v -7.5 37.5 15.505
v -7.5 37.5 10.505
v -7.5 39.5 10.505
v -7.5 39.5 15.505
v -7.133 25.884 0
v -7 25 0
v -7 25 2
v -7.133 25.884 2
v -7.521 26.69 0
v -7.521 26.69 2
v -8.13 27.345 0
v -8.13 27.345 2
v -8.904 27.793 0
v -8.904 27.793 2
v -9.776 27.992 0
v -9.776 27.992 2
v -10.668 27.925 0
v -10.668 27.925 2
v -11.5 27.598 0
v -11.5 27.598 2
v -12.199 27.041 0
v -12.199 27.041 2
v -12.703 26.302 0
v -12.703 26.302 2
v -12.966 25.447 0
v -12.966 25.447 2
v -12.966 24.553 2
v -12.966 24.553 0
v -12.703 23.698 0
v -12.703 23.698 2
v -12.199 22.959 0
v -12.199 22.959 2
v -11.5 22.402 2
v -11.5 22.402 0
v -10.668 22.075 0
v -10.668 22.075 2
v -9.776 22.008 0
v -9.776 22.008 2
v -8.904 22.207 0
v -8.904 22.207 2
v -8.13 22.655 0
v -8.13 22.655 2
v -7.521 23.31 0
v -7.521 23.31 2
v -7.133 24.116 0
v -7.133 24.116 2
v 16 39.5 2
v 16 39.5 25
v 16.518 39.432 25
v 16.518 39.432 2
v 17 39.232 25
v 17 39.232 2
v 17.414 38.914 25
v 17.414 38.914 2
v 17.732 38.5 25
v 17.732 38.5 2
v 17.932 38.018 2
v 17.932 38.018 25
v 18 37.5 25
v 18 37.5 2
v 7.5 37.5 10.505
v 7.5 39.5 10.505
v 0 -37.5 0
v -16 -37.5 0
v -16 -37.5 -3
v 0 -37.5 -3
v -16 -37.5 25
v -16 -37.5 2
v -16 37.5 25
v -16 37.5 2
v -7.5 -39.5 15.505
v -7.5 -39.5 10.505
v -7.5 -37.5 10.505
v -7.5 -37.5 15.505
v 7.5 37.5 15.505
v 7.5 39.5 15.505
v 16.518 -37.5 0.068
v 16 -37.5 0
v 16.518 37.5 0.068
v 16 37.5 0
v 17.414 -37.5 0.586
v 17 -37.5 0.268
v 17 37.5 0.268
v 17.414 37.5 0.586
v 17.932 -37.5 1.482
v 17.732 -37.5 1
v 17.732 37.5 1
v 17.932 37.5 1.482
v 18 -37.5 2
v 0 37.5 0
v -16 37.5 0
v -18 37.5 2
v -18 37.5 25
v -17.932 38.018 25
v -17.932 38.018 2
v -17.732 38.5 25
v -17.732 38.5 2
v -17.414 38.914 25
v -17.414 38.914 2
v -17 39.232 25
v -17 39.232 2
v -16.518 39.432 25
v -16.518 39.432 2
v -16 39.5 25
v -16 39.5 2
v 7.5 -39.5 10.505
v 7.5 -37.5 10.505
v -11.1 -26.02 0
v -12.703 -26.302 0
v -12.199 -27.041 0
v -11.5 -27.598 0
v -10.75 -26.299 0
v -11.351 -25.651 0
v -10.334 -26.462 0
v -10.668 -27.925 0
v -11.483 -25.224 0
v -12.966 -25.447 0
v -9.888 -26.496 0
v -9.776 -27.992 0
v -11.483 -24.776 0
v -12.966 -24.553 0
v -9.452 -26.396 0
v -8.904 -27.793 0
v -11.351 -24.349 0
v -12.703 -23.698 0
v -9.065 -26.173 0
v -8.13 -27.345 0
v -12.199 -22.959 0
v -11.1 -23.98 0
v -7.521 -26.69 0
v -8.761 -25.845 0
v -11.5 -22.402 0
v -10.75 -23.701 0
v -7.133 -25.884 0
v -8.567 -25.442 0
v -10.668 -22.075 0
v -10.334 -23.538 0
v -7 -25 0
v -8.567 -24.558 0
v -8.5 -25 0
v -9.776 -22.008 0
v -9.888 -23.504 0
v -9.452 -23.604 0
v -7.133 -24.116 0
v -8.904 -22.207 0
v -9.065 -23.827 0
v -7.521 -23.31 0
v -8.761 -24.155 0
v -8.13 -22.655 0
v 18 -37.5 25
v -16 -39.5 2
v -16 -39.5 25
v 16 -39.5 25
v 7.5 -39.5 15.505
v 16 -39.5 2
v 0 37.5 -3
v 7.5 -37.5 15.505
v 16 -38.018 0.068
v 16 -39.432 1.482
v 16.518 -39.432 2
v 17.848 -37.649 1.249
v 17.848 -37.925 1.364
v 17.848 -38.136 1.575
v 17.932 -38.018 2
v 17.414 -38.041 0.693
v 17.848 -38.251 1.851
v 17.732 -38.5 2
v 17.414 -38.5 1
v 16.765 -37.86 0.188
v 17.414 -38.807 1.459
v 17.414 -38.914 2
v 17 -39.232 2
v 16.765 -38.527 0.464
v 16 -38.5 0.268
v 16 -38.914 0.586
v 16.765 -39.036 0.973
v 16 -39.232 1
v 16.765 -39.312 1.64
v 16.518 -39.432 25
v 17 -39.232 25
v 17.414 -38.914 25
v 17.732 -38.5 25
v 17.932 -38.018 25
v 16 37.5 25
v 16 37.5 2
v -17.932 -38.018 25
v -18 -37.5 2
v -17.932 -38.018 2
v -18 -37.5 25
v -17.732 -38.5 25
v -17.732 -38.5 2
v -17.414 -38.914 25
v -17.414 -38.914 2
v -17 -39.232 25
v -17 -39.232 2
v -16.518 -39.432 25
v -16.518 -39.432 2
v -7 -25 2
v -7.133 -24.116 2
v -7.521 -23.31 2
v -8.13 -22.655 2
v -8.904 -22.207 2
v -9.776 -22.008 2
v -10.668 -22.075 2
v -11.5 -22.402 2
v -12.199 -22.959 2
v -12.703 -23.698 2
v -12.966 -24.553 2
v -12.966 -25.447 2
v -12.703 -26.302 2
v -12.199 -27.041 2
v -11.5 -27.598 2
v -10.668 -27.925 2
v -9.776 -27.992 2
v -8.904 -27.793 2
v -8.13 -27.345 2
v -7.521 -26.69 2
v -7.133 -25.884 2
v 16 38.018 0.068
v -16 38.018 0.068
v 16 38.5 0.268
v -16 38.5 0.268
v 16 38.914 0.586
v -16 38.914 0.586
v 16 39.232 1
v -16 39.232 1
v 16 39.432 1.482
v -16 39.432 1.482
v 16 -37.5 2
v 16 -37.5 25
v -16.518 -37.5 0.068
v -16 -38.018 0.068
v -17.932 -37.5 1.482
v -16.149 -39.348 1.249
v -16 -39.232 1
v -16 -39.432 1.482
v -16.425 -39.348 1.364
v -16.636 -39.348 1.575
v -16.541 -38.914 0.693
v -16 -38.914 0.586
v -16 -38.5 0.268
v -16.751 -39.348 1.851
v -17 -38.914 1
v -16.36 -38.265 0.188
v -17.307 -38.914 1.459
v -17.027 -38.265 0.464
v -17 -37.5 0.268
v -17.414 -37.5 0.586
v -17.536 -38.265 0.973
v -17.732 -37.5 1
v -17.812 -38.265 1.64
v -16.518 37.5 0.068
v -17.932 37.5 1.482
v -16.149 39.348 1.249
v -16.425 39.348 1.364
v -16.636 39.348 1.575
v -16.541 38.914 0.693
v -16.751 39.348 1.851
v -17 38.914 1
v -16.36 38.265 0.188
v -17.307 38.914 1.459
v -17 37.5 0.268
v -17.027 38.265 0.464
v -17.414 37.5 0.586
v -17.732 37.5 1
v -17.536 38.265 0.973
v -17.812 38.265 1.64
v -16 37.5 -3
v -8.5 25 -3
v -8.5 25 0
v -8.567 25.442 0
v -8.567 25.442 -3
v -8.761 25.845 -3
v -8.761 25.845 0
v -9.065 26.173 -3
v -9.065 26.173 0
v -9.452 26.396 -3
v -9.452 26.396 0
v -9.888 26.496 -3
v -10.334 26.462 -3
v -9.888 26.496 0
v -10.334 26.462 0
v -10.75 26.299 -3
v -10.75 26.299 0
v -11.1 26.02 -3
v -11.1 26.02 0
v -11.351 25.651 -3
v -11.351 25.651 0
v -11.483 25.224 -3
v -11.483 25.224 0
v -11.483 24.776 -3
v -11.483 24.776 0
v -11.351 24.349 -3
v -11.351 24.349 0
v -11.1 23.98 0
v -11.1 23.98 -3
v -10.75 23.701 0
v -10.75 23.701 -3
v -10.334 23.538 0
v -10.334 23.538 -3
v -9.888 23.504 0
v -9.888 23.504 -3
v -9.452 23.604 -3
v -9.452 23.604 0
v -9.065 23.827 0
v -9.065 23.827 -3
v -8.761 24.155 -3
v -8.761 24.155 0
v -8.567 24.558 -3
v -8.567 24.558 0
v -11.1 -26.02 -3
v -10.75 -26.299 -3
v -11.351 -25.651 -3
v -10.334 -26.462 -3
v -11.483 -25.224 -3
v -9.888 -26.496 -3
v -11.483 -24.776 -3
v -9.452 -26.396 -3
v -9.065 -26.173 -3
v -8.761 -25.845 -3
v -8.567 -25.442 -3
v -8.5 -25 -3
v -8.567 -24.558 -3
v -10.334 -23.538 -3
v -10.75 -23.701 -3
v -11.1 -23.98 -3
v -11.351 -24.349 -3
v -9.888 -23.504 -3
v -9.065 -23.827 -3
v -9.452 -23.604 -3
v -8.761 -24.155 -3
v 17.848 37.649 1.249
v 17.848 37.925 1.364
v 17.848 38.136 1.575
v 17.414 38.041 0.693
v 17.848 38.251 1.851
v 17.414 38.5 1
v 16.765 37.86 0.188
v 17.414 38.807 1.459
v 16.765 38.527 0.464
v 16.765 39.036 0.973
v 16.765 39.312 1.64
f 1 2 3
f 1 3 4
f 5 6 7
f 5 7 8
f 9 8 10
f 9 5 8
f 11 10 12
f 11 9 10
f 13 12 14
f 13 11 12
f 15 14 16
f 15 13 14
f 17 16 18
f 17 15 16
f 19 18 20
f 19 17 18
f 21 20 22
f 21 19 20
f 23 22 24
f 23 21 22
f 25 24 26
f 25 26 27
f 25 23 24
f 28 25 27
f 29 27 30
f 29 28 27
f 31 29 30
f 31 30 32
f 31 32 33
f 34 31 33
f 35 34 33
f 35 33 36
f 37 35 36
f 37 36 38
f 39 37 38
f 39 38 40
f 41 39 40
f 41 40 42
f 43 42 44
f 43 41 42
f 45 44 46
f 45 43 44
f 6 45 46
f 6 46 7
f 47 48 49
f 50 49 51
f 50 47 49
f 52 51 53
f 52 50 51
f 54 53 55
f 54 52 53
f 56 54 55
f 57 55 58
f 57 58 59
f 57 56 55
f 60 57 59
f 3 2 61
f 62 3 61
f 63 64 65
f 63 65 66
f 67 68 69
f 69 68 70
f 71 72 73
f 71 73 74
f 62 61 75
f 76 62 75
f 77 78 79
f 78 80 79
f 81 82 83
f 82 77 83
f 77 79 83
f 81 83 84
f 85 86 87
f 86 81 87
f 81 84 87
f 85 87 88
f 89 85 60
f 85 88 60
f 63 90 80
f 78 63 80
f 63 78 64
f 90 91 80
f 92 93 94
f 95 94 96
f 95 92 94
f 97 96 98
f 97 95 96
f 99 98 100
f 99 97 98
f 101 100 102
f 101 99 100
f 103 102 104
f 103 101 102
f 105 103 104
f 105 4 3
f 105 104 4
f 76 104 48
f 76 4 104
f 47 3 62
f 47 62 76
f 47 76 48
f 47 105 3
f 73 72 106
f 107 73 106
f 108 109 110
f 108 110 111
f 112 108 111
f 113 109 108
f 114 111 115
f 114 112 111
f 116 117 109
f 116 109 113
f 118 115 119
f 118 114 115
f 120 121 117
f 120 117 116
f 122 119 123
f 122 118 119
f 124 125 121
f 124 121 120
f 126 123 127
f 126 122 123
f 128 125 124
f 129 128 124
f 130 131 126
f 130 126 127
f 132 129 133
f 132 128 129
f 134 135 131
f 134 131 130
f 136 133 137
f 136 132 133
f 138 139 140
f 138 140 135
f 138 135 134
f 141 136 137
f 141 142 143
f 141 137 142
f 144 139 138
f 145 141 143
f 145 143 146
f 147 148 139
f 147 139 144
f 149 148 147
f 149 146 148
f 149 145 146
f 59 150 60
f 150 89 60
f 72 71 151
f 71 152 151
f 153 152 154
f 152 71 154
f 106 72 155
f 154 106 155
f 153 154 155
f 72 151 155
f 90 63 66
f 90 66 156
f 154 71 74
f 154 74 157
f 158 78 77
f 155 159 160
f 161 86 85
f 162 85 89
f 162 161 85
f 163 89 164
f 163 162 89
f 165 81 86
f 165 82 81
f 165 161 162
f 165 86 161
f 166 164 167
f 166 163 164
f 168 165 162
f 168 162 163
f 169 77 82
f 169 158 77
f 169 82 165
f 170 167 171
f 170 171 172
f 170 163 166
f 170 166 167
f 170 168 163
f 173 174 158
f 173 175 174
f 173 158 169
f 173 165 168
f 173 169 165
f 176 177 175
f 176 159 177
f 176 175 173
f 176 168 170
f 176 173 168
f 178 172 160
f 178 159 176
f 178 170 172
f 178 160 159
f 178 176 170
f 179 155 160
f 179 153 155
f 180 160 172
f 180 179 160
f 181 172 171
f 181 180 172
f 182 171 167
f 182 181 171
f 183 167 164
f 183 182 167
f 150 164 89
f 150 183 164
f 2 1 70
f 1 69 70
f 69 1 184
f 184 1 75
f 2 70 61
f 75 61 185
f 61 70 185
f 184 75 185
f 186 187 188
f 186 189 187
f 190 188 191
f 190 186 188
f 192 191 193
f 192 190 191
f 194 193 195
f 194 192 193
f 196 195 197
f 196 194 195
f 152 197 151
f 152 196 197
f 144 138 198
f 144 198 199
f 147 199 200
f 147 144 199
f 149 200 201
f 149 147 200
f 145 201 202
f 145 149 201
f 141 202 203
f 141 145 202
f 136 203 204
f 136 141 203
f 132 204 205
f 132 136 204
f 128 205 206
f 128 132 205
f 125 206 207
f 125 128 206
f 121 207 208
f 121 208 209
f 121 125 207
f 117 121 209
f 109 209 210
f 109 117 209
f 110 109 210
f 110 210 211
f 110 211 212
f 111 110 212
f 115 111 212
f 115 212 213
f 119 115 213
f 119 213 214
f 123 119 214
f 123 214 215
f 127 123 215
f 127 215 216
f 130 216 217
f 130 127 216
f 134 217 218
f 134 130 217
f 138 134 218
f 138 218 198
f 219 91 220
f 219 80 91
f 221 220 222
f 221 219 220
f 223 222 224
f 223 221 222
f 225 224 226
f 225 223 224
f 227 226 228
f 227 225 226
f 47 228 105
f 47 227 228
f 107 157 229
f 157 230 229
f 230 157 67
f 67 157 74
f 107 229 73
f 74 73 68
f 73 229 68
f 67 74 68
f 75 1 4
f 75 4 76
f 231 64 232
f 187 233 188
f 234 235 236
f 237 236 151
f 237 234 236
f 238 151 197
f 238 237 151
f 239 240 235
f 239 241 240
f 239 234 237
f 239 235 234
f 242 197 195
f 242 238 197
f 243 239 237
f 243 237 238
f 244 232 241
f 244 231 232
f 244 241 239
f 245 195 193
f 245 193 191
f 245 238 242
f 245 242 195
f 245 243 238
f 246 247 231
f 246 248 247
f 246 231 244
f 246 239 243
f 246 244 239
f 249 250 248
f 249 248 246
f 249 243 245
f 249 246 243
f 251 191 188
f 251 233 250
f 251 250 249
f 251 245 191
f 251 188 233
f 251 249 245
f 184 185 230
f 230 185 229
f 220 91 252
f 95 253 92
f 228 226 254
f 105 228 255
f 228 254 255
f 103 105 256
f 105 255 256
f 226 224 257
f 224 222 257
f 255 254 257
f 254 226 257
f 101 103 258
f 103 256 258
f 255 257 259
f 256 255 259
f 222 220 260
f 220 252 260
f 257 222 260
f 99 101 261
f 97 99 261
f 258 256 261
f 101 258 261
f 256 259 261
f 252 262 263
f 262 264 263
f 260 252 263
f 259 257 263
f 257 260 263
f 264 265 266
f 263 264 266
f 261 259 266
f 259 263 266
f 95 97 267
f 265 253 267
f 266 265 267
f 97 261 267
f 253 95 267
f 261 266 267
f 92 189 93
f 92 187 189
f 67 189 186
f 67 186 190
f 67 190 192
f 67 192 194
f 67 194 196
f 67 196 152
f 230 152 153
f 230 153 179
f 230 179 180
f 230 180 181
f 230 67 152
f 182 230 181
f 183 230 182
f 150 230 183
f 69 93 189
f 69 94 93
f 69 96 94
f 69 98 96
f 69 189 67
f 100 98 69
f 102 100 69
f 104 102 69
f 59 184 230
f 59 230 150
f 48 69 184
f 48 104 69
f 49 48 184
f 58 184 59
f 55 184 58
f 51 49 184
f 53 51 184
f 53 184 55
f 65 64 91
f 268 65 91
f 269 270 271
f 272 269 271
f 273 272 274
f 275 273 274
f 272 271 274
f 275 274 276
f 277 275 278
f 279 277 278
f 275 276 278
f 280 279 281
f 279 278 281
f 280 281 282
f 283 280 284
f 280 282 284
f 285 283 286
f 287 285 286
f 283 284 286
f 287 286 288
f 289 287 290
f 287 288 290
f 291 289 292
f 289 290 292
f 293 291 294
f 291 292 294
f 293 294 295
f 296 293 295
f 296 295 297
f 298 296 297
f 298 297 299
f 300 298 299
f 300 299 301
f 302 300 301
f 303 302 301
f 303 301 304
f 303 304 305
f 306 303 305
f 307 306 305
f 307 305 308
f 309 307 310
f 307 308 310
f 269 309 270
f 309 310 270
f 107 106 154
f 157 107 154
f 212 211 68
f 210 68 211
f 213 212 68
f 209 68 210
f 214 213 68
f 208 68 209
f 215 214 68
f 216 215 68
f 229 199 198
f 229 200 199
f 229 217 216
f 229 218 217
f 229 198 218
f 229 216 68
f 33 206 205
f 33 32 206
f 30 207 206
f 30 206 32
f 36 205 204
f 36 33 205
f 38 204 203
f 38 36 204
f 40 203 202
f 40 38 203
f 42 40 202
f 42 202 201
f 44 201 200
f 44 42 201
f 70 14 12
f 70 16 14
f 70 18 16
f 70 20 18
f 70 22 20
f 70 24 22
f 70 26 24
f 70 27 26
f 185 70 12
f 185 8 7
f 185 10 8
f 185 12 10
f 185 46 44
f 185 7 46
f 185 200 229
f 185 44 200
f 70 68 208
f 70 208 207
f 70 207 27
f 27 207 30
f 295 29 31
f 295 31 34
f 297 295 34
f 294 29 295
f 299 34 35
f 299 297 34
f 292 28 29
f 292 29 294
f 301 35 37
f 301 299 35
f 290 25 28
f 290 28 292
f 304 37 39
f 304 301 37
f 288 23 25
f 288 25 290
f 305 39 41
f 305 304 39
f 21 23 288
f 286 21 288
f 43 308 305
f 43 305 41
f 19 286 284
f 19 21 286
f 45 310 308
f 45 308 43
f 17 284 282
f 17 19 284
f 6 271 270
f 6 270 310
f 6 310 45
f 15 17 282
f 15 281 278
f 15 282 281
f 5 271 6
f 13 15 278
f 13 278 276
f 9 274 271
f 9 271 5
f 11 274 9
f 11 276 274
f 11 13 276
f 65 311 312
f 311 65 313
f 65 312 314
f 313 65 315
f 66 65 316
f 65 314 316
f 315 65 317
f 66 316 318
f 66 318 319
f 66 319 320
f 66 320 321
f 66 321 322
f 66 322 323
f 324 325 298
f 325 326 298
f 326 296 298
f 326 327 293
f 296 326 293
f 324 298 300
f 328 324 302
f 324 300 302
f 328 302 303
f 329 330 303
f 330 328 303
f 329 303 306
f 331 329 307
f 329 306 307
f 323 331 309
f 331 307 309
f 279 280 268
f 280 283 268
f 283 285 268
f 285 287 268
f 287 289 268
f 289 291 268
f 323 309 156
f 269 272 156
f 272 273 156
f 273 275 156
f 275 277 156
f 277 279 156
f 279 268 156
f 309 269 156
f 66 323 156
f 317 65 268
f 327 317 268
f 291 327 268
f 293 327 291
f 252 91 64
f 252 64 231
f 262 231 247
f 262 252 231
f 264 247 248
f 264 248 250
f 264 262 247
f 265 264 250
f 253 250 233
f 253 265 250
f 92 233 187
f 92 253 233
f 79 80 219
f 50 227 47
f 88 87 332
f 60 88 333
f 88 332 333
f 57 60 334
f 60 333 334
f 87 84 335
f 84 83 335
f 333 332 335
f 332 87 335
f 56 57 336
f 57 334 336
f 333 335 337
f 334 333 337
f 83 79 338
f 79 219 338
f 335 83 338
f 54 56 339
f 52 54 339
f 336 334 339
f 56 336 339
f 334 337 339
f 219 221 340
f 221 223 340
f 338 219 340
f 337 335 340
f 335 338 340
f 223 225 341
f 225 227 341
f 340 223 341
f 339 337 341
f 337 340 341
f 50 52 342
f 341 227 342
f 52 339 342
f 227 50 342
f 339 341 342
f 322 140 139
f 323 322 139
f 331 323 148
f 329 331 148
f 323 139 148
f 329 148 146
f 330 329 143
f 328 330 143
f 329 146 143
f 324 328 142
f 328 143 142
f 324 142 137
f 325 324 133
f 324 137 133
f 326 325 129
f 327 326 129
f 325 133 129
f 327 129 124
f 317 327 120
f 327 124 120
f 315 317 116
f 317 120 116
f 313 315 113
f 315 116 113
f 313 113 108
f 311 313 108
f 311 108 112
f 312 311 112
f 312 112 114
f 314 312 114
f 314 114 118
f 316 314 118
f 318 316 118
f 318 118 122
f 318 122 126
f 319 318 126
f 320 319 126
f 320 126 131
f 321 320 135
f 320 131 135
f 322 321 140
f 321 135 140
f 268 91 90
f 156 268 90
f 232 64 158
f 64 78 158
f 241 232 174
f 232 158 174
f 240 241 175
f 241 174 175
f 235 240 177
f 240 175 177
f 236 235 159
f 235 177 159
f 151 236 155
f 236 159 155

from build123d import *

# Parameters (mm, degrees)
F0_W     = 36
F0_H     = 79
F0_W_2   = 16
F0_H_2   = 75
F0_R     = 3
F1_DEPTH = 2
F2_DEPTH = 25
F0_R_2   = 1.5
F3_DEPTH = 3
F4_R     = 1.99999
F5_W     = 15
F5_H     = 5
F6_DEPTH = 100


# Not quite as in the source:
# - a fillet or chamfer is up to 0.001 mm smaller than in the source, because OpenCascade refuses the exact size


with BuildPart() as f1:
    # F0 (on Top) → F1 (new body)
    with BuildSketch(Plane.XY):
        Rectangle(F0_W, F0_H)
        Polygon((0, 37.5), (16, 37.5), (16, -37.5), (0, -37.5), (-16, -37.5), (-16, 37.5), align=None, mode=Mode.SUBTRACT)
        with Locations((8, 0)):
            Rectangle(F0_W_2, F0_H_2)
        with Locations((-8, 0)):
            Rectangle(F0_W_2, F0_H_2)
        with Locations((-10, -25)):
            Circle(F0_R, mode=Mode.SUBTRACT)
        with Locations((-10, 25)):
            Circle(F0_R, mode=Mode.SUBTRACT)
    extrude(amount=F1_DEPTH)

    # F0 (on Top) → F2 (join)
    with BuildSketch(Plane.XY):
        Rectangle(F0_W, F0_H)
        Polygon((0, 37.5), (16, 37.5), (16, -37.5), (0, -37.5), (-16, -37.5), (-16, 37.5), align=None, mode=Mode.SUBTRACT)
    extrude(amount=F2_DEPTH)

    # F0 (on Top) → F3 (join)
    with BuildSketch(Plane.XY):
        with Locations((-8, 0)):
            Rectangle(F0_W_2, F0_H_2)
        with Locations((-10, -25)):
            Circle(F0_R, mode=Mode.SUBTRACT)
        with Locations((-10, 25)):
            Circle(F0_R, mode=Mode.SUBTRACT)
        with Locations((-10, 25)):
            Circle(F0_R)
        with Locations((-10, 25)):
            Circle(F0_R_2, mode=Mode.SUBTRACT)
        with Locations((-10, -25)):
            Circle(F0_R)
        with Locations((-10, -25)):
            Circle(F0_R_2, mode=Mode.SUBTRACT)
    extrude(amount=-F3_DEPTH)

    # F4 (radius 2 in the source; OpenCascade refuses exactly that, so slightly less here)
    f4_edges = [f1.edges().sort_by_distance(p)[0] for p in [
        (-18, 0, 0),
        (0, -39.5, 0),
        (0, 39.5, 0),
        (18, 0, 0),
        (18, 39.5, 12.5),
        (-18, 39.5, 12.5),
        (-18, -39.5, 12.5),
        (18, -39.5, 12.5),
    ]]
    fillet(f4_edges, radius=F4_R)

    # F5 (on face) → F6 (cut)
    with BuildSketch(Plane.XZ.offset(39.5)):
        with Locations((0, 13.0054904148)):
            Rectangle(F5_W, F5_H)
    extrude(amount=-F6_DEPTH, mode=Mode.SUBTRACT)


solid = f1.part
